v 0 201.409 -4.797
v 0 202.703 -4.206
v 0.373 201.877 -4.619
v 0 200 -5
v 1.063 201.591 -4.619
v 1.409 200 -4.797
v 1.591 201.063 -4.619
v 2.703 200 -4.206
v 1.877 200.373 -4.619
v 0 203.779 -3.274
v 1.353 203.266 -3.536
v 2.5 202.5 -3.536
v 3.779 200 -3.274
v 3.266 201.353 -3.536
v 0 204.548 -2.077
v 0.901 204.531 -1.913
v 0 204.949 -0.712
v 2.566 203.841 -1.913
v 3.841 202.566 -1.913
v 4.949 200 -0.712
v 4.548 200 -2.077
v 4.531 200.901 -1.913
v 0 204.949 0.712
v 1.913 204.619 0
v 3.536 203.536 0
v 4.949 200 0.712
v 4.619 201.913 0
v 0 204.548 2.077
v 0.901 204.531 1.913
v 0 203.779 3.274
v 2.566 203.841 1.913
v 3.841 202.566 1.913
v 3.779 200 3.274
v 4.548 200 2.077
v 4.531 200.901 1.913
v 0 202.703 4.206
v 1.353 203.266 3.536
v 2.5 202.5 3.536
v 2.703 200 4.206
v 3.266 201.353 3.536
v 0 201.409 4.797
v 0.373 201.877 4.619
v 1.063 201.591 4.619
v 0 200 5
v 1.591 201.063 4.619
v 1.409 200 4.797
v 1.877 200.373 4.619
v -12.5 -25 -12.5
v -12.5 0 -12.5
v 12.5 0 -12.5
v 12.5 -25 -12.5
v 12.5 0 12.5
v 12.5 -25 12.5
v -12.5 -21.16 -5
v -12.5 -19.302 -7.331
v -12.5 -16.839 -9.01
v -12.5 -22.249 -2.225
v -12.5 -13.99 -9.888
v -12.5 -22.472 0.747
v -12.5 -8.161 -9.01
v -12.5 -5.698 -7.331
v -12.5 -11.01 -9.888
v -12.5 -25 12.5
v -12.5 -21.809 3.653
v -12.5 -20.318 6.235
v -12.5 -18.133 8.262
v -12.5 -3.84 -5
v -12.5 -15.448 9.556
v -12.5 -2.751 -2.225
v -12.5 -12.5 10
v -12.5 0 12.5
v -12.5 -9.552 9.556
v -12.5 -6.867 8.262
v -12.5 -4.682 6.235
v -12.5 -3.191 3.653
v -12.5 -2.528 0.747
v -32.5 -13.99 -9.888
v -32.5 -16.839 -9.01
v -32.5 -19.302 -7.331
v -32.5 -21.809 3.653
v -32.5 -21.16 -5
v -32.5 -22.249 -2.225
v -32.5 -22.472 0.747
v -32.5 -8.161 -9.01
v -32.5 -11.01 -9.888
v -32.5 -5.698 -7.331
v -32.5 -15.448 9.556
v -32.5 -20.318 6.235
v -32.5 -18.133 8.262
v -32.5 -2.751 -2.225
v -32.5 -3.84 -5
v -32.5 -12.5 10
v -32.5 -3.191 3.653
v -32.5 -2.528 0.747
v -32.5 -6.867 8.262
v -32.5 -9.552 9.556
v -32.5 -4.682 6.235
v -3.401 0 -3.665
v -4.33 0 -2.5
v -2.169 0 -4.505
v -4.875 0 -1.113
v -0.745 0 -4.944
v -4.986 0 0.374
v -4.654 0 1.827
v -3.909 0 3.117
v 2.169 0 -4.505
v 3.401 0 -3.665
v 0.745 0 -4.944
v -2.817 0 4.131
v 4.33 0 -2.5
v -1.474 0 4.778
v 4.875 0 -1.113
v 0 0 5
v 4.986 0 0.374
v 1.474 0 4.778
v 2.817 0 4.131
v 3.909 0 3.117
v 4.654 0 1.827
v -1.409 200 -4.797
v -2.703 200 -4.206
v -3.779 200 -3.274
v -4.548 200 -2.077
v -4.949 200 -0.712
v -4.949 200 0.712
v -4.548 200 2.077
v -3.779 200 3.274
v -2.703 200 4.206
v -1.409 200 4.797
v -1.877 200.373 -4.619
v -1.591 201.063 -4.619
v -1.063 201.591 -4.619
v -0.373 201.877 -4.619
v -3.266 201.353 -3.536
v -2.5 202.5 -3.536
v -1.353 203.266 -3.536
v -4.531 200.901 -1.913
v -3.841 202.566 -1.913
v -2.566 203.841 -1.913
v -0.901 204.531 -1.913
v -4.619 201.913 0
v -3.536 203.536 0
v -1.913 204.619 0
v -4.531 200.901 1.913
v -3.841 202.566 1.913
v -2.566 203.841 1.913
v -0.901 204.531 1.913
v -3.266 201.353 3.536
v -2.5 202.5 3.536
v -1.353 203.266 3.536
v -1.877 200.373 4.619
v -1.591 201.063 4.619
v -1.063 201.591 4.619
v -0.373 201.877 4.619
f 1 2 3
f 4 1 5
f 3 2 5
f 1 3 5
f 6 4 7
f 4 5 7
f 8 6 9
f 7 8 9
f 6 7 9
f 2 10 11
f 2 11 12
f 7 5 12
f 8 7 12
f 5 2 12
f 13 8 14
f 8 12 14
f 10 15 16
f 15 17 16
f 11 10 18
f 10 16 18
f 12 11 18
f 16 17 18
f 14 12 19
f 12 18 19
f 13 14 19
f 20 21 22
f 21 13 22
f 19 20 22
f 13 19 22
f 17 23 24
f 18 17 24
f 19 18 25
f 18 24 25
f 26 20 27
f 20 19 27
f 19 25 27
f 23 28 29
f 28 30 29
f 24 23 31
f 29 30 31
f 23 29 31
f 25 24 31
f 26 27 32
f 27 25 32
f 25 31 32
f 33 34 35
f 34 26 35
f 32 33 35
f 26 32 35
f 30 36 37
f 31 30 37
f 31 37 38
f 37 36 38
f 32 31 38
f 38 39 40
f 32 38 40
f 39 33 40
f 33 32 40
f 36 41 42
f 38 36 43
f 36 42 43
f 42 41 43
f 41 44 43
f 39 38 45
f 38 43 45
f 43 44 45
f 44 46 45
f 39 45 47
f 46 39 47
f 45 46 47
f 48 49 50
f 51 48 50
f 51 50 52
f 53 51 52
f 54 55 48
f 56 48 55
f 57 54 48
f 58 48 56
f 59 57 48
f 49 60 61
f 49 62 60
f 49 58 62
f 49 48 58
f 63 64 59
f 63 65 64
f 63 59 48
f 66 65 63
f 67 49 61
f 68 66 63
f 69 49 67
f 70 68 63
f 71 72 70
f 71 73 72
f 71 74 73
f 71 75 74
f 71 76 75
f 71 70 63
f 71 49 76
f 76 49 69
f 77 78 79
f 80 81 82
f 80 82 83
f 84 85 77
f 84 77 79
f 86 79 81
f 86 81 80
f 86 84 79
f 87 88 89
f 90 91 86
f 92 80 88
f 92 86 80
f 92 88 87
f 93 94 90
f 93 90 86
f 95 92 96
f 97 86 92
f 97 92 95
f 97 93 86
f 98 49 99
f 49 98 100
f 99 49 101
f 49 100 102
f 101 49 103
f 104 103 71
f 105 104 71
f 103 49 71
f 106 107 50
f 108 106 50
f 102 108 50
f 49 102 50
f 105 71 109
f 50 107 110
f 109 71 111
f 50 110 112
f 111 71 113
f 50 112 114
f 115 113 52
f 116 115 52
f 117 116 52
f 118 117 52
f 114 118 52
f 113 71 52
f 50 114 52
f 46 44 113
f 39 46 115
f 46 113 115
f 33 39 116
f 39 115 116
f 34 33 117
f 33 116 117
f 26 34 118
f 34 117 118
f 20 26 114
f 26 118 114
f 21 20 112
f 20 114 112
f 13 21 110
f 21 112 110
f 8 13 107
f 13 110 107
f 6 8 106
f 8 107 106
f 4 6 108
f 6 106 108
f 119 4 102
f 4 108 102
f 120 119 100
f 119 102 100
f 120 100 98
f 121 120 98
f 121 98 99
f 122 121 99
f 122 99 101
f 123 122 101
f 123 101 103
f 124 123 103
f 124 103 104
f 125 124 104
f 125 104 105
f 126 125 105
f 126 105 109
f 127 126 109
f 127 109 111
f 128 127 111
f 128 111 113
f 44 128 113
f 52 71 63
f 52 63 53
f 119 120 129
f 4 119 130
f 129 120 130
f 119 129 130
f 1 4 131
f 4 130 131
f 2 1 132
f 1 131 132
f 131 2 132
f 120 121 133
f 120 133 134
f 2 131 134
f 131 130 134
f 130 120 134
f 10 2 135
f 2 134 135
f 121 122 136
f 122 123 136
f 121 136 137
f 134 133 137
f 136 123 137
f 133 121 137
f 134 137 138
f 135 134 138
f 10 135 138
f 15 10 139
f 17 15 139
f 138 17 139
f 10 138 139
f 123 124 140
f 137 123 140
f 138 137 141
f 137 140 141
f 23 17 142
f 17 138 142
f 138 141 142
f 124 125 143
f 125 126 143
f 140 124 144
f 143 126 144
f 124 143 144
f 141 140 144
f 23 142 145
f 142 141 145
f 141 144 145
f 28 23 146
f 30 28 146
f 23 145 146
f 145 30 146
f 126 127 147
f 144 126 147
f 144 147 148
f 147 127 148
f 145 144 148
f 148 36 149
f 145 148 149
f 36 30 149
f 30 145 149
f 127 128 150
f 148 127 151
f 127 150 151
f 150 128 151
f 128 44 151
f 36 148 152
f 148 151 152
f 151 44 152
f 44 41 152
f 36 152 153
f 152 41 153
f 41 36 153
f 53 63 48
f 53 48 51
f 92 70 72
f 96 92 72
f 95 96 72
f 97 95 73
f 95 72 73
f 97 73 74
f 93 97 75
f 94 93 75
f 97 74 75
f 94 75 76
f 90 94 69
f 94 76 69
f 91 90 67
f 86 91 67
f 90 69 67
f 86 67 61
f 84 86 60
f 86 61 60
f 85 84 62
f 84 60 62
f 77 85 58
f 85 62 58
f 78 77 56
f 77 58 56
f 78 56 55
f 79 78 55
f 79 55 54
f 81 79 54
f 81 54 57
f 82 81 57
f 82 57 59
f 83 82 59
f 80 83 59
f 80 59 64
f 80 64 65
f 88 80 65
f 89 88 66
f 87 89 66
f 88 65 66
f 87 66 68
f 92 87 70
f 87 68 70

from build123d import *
from build123d.topology import SkipClean

# Parameters (mm, degrees)
SKETCH2_R           = 5
BOSS_EXTRUDE1_DEPTH = 200
SKETCH3_W           = 25
SKETCH3_H           = 25
BOSS_EXTRUDE2_DEPTH = 25
SKETCH4_R           = 10
BOSS_EXTRUDE3_DEPTH = 20


with BuildPart() as part:
    # Sketch2 → Boss-Extrude1 (new body)
    with BuildSketch(Plane(origin=(0, 0, 0), x_dir=(1, 0, 0), z_dir=(0, 1, 0))):
        with Locations(Location((0, 0, 0), (0, 0, 270))):
            Circle(SKETCH2_R)
    extrude(amount=BOSS_EXTRUDE1_DEPTH)

    # Sketch3 → Boss-Extrude2 (add)
    with BuildSketch(Plane.XZ):
        Rectangle(SKETCH3_W, SKETCH3_H)
    extrude(amount=BOSS_EXTRUDE2_DEPTH)

    # Sketch4 → Boss-Extrude3 (add)
    with BuildSketch(Plane.ZY.offset(12.5)):
        with Locations((0, -12.5)):
            Circle(SKETCH4_R)
    extrude(amount=BOSS_EXTRUDE3_DEPTH)

    # Sketch6 → Revolve2 (revolve)
    with SkipClean():  # the faces are left unmerged after this step: merging them gives an invalid solid
        with BuildSketch(Plane(origin=(0, 0, 0), x_dir=(0, 0, -1), z_dir=(1, 0, 0))):
            with BuildLine():
                Line((-5, 200), (5, 200))
                ThreePointArc((5, 200), (0, 205), (-5, 200))
            make_face()
        revolve(axis=Axis((0, 200, 5), (0, 0, -1)))


solid = part.part
